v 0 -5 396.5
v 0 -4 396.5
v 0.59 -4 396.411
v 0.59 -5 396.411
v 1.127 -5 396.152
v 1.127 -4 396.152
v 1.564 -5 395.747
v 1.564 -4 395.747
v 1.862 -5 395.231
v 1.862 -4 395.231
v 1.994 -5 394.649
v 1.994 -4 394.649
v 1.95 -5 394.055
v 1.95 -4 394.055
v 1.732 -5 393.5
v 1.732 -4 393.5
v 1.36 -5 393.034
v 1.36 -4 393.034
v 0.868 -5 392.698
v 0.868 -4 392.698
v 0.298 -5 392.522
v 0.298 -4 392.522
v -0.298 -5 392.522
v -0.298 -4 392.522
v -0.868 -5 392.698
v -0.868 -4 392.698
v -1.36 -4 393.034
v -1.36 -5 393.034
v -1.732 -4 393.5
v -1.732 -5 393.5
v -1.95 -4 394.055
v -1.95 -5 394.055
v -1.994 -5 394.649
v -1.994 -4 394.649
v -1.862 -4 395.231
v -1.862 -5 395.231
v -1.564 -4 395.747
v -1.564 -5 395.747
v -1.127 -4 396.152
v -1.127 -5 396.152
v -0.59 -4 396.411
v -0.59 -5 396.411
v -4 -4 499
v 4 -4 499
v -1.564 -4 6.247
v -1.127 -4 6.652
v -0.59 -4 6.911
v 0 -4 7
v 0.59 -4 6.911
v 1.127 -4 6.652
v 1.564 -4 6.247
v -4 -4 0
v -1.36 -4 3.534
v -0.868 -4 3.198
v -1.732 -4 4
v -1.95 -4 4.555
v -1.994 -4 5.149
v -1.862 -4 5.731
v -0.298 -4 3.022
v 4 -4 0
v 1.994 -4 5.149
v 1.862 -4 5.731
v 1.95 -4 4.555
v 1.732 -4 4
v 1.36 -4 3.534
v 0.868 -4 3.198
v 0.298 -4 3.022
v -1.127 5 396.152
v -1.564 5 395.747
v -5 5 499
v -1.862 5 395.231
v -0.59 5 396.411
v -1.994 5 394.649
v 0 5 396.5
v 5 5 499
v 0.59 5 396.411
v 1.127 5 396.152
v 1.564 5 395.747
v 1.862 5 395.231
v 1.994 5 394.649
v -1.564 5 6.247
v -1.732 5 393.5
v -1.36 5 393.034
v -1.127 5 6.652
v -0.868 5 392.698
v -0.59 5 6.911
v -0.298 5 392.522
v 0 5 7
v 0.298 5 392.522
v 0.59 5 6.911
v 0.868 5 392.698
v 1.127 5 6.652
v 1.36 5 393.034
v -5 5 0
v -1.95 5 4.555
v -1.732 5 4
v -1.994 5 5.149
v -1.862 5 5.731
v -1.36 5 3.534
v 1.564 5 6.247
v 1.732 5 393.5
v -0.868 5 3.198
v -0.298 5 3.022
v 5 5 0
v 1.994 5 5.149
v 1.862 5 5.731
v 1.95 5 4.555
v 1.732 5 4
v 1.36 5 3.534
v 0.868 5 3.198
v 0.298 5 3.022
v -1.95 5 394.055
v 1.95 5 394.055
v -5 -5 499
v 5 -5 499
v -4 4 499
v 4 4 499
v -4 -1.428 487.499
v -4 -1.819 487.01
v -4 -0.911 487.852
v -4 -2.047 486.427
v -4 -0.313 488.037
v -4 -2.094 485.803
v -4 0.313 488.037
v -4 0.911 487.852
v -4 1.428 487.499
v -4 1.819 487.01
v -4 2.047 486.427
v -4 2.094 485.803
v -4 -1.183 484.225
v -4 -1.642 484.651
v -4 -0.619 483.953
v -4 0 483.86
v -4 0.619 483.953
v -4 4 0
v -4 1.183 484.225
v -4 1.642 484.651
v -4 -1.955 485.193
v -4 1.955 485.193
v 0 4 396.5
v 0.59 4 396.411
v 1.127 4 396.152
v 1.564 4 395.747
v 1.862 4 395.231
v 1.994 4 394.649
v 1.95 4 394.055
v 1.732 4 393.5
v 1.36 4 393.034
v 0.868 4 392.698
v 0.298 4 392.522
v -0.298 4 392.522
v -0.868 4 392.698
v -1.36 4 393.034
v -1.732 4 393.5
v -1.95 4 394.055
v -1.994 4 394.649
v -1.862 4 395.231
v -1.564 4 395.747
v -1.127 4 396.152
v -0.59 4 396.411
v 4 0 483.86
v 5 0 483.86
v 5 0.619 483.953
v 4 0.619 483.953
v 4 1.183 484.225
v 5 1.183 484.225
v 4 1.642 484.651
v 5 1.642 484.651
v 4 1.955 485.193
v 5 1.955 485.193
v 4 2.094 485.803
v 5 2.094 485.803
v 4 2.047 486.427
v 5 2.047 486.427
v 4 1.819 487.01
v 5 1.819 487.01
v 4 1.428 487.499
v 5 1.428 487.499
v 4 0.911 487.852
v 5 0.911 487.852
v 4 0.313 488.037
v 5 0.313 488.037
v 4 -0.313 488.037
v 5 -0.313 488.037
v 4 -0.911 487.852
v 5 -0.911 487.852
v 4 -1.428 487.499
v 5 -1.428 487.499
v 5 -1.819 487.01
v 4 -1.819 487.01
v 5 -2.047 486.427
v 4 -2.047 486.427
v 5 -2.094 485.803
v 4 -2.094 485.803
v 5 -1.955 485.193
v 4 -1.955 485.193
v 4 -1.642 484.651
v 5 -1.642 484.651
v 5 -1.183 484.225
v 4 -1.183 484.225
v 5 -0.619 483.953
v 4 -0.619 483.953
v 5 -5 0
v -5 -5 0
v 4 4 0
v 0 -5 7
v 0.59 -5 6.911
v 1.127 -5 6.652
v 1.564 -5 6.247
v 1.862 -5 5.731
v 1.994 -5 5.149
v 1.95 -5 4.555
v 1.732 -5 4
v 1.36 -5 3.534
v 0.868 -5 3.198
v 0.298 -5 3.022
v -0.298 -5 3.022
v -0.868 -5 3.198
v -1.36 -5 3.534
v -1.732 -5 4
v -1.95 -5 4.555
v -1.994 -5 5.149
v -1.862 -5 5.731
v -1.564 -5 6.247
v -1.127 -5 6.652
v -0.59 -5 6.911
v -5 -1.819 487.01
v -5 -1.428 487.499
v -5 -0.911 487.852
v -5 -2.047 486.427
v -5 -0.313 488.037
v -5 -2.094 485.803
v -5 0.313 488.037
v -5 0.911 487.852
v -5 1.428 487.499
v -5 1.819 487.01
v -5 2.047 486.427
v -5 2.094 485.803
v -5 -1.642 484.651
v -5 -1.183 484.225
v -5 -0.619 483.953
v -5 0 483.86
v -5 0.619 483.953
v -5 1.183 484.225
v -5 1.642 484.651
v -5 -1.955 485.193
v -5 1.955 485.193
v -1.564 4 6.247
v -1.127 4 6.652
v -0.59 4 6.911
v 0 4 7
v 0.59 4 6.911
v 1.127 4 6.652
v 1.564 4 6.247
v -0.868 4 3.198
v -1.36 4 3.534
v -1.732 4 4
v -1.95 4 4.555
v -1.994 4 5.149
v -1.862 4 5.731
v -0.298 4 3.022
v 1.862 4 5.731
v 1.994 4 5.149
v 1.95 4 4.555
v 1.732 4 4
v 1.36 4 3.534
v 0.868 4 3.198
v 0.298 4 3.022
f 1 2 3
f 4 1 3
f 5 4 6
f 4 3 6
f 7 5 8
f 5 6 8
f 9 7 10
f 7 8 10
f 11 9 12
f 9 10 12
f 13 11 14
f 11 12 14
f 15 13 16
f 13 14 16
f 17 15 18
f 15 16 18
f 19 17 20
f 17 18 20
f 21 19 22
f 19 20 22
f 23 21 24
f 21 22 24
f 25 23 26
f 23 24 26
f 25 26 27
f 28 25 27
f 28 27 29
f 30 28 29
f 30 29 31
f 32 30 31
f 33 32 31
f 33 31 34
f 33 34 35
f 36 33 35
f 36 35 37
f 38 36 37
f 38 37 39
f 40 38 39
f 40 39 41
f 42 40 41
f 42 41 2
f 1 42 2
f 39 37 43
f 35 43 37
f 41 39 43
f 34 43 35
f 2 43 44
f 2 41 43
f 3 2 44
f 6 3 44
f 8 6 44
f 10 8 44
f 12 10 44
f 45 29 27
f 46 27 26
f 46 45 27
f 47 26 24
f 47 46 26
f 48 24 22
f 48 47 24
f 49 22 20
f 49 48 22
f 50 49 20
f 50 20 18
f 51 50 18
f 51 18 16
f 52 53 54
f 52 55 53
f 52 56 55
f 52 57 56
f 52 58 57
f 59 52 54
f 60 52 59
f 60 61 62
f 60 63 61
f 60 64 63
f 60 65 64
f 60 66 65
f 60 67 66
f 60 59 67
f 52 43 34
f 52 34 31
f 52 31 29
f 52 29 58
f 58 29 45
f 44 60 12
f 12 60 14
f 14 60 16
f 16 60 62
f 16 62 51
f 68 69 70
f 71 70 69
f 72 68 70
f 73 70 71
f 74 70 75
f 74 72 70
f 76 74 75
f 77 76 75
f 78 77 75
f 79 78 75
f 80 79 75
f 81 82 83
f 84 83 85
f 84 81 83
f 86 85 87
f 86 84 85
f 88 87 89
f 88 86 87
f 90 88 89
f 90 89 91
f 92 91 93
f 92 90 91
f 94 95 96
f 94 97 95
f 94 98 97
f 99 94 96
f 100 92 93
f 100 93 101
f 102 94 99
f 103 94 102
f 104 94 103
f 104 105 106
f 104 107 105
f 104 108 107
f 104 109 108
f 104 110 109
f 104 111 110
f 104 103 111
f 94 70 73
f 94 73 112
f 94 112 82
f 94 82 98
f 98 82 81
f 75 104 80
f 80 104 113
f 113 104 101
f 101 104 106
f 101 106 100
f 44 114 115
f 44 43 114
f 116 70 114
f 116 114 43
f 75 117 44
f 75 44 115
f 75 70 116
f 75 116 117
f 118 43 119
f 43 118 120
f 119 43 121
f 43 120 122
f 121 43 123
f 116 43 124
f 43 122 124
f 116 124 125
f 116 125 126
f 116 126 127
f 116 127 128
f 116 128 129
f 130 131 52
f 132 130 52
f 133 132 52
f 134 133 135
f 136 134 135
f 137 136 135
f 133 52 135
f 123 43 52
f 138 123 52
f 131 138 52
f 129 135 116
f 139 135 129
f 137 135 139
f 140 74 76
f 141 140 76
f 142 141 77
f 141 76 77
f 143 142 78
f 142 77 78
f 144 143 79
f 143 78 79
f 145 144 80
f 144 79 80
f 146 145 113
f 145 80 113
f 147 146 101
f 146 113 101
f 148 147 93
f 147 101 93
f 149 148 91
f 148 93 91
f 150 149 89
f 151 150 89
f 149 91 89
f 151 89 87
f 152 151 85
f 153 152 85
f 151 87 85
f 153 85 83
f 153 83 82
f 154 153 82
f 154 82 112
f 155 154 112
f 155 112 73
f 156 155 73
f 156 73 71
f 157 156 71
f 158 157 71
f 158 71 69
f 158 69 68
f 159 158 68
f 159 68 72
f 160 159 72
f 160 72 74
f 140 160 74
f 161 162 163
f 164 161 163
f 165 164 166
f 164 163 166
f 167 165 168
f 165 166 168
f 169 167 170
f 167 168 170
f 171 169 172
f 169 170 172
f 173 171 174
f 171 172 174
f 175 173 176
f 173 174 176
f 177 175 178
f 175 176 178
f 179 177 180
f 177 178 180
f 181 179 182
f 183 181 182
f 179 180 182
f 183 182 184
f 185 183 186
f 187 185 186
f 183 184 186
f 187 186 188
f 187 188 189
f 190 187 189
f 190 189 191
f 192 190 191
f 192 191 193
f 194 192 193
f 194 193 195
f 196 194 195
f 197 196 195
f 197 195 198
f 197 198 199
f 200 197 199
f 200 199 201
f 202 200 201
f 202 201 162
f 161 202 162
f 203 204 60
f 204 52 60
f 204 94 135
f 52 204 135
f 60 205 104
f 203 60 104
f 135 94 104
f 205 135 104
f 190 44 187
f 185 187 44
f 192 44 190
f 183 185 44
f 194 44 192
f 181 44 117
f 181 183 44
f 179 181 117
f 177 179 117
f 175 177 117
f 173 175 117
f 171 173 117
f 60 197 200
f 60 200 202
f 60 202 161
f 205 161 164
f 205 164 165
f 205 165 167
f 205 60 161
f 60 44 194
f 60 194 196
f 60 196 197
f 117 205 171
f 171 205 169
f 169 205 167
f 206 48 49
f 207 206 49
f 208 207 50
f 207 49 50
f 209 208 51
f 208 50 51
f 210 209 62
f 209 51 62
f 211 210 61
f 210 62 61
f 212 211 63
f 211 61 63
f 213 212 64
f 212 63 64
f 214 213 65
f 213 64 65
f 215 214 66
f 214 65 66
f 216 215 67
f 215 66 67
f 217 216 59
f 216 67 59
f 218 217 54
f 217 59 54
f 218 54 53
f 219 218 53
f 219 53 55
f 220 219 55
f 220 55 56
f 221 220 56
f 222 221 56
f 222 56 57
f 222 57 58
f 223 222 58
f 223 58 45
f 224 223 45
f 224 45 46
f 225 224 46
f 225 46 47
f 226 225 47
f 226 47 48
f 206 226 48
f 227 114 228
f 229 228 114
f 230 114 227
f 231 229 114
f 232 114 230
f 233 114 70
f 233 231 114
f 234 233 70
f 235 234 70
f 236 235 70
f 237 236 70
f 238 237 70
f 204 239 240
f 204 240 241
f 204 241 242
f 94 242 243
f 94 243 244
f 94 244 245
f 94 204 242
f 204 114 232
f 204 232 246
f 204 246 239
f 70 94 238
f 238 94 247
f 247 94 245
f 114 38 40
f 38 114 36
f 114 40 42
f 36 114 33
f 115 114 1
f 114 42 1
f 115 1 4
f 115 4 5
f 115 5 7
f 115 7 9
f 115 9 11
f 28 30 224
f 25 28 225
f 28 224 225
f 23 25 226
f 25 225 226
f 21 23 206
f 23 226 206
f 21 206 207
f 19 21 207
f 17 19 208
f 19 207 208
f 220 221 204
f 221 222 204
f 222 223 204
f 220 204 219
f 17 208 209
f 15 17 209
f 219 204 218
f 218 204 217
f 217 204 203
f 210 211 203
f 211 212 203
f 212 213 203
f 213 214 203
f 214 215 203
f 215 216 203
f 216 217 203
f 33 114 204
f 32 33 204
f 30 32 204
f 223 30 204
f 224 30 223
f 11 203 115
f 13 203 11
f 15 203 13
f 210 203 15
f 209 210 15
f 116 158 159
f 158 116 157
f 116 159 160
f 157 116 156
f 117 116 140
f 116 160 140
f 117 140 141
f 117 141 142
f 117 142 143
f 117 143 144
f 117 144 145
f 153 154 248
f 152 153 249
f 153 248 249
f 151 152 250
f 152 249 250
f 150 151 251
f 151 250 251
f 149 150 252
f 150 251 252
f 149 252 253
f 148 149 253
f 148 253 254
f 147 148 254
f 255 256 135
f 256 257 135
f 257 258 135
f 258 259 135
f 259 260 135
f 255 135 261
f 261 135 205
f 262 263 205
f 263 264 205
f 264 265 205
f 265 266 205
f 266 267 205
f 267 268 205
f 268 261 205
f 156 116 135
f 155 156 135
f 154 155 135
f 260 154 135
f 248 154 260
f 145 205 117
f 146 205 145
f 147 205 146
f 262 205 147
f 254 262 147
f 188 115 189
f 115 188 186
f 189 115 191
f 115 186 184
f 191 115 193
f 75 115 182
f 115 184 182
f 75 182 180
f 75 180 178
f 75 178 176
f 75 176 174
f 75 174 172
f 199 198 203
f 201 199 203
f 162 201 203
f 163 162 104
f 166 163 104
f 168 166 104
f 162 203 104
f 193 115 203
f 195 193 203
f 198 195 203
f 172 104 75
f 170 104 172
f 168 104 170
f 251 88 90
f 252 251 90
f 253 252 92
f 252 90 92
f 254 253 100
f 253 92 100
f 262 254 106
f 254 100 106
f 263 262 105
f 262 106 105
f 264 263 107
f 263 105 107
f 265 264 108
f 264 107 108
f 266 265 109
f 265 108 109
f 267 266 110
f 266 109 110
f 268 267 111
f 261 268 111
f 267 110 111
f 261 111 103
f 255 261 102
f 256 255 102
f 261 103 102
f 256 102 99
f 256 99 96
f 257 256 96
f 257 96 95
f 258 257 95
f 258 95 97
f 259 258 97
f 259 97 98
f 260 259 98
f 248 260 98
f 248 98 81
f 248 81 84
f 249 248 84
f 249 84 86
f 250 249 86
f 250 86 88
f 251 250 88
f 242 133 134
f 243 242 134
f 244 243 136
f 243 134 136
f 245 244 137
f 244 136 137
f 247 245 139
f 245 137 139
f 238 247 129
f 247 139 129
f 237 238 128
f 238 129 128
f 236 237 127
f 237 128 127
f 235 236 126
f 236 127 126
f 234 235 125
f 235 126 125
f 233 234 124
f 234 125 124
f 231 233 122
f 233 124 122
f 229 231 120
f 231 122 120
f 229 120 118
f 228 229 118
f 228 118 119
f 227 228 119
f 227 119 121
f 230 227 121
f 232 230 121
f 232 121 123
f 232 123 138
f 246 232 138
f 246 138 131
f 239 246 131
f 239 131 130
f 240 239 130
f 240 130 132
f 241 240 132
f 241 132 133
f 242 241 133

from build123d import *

# Parameters (mm, degrees)
SKETCH_1_W          = 10
SKETCH_1_H          = 10
SKETCH_1_W_2        = 8
SKETCH_1_H_2        = 8
EXTRUDE_1_DEPTH     = 499
SKETCH_2_R          = 2
CUT_EXTRUDE_1_DEPTH = 500.125234786
SKETCH_3_R          = 2.1
CUT_EXTRUDE_2_DEPTH = 500.125234786


with BuildPart() as part:
    # ｽｹｯﾁ1 → 押し出し-薄板1 (new body)
    with BuildSketch(Plane.XY):
        Rectangle(SKETCH_1_W, SKETCH_1_H)
        Rectangle(SKETCH_1_W_2, SKETCH_1_H_2, mode=Mode.SUBTRACT)
    extrude(amount=EXTRUDE_1_DEPTH)

    # ｽｹｯﾁ2 → ｶｯﾄ - 押し出し1 (cut, through all)
    with BuildSketch(Plane(origin=(0, 5, 0), x_dir=(1, 0, 0), z_dir=(0, 1, 0))):
        with Locations(Location((0, -5, 0), (0, 0, 270))):
            Circle(SKETCH_2_R)
        with Locations(Location((0, -394.5, 0), (0, 0, 270))):
            Circle(SKETCH_2_R)
    extrude(amount=-CUT_EXTRUDE_1_DEPTH, mode=Mode.SUBTRACT)

    # ｽｹｯﾁ3 → ｶｯﾄ - 押し出し2 (cut, through all)
    with BuildSketch(Plane(origin=(5, 0, 0), x_dir=(0, 0, -1), z_dir=(1, 0, 0))):
        with Locations((-485.96, 0)):
            Circle(SKETCH_3_R)
    extrude(amount=-CUT_EXTRUDE_2_DEPTH, mode=Mode.SUBTRACT)


solid = part.part
